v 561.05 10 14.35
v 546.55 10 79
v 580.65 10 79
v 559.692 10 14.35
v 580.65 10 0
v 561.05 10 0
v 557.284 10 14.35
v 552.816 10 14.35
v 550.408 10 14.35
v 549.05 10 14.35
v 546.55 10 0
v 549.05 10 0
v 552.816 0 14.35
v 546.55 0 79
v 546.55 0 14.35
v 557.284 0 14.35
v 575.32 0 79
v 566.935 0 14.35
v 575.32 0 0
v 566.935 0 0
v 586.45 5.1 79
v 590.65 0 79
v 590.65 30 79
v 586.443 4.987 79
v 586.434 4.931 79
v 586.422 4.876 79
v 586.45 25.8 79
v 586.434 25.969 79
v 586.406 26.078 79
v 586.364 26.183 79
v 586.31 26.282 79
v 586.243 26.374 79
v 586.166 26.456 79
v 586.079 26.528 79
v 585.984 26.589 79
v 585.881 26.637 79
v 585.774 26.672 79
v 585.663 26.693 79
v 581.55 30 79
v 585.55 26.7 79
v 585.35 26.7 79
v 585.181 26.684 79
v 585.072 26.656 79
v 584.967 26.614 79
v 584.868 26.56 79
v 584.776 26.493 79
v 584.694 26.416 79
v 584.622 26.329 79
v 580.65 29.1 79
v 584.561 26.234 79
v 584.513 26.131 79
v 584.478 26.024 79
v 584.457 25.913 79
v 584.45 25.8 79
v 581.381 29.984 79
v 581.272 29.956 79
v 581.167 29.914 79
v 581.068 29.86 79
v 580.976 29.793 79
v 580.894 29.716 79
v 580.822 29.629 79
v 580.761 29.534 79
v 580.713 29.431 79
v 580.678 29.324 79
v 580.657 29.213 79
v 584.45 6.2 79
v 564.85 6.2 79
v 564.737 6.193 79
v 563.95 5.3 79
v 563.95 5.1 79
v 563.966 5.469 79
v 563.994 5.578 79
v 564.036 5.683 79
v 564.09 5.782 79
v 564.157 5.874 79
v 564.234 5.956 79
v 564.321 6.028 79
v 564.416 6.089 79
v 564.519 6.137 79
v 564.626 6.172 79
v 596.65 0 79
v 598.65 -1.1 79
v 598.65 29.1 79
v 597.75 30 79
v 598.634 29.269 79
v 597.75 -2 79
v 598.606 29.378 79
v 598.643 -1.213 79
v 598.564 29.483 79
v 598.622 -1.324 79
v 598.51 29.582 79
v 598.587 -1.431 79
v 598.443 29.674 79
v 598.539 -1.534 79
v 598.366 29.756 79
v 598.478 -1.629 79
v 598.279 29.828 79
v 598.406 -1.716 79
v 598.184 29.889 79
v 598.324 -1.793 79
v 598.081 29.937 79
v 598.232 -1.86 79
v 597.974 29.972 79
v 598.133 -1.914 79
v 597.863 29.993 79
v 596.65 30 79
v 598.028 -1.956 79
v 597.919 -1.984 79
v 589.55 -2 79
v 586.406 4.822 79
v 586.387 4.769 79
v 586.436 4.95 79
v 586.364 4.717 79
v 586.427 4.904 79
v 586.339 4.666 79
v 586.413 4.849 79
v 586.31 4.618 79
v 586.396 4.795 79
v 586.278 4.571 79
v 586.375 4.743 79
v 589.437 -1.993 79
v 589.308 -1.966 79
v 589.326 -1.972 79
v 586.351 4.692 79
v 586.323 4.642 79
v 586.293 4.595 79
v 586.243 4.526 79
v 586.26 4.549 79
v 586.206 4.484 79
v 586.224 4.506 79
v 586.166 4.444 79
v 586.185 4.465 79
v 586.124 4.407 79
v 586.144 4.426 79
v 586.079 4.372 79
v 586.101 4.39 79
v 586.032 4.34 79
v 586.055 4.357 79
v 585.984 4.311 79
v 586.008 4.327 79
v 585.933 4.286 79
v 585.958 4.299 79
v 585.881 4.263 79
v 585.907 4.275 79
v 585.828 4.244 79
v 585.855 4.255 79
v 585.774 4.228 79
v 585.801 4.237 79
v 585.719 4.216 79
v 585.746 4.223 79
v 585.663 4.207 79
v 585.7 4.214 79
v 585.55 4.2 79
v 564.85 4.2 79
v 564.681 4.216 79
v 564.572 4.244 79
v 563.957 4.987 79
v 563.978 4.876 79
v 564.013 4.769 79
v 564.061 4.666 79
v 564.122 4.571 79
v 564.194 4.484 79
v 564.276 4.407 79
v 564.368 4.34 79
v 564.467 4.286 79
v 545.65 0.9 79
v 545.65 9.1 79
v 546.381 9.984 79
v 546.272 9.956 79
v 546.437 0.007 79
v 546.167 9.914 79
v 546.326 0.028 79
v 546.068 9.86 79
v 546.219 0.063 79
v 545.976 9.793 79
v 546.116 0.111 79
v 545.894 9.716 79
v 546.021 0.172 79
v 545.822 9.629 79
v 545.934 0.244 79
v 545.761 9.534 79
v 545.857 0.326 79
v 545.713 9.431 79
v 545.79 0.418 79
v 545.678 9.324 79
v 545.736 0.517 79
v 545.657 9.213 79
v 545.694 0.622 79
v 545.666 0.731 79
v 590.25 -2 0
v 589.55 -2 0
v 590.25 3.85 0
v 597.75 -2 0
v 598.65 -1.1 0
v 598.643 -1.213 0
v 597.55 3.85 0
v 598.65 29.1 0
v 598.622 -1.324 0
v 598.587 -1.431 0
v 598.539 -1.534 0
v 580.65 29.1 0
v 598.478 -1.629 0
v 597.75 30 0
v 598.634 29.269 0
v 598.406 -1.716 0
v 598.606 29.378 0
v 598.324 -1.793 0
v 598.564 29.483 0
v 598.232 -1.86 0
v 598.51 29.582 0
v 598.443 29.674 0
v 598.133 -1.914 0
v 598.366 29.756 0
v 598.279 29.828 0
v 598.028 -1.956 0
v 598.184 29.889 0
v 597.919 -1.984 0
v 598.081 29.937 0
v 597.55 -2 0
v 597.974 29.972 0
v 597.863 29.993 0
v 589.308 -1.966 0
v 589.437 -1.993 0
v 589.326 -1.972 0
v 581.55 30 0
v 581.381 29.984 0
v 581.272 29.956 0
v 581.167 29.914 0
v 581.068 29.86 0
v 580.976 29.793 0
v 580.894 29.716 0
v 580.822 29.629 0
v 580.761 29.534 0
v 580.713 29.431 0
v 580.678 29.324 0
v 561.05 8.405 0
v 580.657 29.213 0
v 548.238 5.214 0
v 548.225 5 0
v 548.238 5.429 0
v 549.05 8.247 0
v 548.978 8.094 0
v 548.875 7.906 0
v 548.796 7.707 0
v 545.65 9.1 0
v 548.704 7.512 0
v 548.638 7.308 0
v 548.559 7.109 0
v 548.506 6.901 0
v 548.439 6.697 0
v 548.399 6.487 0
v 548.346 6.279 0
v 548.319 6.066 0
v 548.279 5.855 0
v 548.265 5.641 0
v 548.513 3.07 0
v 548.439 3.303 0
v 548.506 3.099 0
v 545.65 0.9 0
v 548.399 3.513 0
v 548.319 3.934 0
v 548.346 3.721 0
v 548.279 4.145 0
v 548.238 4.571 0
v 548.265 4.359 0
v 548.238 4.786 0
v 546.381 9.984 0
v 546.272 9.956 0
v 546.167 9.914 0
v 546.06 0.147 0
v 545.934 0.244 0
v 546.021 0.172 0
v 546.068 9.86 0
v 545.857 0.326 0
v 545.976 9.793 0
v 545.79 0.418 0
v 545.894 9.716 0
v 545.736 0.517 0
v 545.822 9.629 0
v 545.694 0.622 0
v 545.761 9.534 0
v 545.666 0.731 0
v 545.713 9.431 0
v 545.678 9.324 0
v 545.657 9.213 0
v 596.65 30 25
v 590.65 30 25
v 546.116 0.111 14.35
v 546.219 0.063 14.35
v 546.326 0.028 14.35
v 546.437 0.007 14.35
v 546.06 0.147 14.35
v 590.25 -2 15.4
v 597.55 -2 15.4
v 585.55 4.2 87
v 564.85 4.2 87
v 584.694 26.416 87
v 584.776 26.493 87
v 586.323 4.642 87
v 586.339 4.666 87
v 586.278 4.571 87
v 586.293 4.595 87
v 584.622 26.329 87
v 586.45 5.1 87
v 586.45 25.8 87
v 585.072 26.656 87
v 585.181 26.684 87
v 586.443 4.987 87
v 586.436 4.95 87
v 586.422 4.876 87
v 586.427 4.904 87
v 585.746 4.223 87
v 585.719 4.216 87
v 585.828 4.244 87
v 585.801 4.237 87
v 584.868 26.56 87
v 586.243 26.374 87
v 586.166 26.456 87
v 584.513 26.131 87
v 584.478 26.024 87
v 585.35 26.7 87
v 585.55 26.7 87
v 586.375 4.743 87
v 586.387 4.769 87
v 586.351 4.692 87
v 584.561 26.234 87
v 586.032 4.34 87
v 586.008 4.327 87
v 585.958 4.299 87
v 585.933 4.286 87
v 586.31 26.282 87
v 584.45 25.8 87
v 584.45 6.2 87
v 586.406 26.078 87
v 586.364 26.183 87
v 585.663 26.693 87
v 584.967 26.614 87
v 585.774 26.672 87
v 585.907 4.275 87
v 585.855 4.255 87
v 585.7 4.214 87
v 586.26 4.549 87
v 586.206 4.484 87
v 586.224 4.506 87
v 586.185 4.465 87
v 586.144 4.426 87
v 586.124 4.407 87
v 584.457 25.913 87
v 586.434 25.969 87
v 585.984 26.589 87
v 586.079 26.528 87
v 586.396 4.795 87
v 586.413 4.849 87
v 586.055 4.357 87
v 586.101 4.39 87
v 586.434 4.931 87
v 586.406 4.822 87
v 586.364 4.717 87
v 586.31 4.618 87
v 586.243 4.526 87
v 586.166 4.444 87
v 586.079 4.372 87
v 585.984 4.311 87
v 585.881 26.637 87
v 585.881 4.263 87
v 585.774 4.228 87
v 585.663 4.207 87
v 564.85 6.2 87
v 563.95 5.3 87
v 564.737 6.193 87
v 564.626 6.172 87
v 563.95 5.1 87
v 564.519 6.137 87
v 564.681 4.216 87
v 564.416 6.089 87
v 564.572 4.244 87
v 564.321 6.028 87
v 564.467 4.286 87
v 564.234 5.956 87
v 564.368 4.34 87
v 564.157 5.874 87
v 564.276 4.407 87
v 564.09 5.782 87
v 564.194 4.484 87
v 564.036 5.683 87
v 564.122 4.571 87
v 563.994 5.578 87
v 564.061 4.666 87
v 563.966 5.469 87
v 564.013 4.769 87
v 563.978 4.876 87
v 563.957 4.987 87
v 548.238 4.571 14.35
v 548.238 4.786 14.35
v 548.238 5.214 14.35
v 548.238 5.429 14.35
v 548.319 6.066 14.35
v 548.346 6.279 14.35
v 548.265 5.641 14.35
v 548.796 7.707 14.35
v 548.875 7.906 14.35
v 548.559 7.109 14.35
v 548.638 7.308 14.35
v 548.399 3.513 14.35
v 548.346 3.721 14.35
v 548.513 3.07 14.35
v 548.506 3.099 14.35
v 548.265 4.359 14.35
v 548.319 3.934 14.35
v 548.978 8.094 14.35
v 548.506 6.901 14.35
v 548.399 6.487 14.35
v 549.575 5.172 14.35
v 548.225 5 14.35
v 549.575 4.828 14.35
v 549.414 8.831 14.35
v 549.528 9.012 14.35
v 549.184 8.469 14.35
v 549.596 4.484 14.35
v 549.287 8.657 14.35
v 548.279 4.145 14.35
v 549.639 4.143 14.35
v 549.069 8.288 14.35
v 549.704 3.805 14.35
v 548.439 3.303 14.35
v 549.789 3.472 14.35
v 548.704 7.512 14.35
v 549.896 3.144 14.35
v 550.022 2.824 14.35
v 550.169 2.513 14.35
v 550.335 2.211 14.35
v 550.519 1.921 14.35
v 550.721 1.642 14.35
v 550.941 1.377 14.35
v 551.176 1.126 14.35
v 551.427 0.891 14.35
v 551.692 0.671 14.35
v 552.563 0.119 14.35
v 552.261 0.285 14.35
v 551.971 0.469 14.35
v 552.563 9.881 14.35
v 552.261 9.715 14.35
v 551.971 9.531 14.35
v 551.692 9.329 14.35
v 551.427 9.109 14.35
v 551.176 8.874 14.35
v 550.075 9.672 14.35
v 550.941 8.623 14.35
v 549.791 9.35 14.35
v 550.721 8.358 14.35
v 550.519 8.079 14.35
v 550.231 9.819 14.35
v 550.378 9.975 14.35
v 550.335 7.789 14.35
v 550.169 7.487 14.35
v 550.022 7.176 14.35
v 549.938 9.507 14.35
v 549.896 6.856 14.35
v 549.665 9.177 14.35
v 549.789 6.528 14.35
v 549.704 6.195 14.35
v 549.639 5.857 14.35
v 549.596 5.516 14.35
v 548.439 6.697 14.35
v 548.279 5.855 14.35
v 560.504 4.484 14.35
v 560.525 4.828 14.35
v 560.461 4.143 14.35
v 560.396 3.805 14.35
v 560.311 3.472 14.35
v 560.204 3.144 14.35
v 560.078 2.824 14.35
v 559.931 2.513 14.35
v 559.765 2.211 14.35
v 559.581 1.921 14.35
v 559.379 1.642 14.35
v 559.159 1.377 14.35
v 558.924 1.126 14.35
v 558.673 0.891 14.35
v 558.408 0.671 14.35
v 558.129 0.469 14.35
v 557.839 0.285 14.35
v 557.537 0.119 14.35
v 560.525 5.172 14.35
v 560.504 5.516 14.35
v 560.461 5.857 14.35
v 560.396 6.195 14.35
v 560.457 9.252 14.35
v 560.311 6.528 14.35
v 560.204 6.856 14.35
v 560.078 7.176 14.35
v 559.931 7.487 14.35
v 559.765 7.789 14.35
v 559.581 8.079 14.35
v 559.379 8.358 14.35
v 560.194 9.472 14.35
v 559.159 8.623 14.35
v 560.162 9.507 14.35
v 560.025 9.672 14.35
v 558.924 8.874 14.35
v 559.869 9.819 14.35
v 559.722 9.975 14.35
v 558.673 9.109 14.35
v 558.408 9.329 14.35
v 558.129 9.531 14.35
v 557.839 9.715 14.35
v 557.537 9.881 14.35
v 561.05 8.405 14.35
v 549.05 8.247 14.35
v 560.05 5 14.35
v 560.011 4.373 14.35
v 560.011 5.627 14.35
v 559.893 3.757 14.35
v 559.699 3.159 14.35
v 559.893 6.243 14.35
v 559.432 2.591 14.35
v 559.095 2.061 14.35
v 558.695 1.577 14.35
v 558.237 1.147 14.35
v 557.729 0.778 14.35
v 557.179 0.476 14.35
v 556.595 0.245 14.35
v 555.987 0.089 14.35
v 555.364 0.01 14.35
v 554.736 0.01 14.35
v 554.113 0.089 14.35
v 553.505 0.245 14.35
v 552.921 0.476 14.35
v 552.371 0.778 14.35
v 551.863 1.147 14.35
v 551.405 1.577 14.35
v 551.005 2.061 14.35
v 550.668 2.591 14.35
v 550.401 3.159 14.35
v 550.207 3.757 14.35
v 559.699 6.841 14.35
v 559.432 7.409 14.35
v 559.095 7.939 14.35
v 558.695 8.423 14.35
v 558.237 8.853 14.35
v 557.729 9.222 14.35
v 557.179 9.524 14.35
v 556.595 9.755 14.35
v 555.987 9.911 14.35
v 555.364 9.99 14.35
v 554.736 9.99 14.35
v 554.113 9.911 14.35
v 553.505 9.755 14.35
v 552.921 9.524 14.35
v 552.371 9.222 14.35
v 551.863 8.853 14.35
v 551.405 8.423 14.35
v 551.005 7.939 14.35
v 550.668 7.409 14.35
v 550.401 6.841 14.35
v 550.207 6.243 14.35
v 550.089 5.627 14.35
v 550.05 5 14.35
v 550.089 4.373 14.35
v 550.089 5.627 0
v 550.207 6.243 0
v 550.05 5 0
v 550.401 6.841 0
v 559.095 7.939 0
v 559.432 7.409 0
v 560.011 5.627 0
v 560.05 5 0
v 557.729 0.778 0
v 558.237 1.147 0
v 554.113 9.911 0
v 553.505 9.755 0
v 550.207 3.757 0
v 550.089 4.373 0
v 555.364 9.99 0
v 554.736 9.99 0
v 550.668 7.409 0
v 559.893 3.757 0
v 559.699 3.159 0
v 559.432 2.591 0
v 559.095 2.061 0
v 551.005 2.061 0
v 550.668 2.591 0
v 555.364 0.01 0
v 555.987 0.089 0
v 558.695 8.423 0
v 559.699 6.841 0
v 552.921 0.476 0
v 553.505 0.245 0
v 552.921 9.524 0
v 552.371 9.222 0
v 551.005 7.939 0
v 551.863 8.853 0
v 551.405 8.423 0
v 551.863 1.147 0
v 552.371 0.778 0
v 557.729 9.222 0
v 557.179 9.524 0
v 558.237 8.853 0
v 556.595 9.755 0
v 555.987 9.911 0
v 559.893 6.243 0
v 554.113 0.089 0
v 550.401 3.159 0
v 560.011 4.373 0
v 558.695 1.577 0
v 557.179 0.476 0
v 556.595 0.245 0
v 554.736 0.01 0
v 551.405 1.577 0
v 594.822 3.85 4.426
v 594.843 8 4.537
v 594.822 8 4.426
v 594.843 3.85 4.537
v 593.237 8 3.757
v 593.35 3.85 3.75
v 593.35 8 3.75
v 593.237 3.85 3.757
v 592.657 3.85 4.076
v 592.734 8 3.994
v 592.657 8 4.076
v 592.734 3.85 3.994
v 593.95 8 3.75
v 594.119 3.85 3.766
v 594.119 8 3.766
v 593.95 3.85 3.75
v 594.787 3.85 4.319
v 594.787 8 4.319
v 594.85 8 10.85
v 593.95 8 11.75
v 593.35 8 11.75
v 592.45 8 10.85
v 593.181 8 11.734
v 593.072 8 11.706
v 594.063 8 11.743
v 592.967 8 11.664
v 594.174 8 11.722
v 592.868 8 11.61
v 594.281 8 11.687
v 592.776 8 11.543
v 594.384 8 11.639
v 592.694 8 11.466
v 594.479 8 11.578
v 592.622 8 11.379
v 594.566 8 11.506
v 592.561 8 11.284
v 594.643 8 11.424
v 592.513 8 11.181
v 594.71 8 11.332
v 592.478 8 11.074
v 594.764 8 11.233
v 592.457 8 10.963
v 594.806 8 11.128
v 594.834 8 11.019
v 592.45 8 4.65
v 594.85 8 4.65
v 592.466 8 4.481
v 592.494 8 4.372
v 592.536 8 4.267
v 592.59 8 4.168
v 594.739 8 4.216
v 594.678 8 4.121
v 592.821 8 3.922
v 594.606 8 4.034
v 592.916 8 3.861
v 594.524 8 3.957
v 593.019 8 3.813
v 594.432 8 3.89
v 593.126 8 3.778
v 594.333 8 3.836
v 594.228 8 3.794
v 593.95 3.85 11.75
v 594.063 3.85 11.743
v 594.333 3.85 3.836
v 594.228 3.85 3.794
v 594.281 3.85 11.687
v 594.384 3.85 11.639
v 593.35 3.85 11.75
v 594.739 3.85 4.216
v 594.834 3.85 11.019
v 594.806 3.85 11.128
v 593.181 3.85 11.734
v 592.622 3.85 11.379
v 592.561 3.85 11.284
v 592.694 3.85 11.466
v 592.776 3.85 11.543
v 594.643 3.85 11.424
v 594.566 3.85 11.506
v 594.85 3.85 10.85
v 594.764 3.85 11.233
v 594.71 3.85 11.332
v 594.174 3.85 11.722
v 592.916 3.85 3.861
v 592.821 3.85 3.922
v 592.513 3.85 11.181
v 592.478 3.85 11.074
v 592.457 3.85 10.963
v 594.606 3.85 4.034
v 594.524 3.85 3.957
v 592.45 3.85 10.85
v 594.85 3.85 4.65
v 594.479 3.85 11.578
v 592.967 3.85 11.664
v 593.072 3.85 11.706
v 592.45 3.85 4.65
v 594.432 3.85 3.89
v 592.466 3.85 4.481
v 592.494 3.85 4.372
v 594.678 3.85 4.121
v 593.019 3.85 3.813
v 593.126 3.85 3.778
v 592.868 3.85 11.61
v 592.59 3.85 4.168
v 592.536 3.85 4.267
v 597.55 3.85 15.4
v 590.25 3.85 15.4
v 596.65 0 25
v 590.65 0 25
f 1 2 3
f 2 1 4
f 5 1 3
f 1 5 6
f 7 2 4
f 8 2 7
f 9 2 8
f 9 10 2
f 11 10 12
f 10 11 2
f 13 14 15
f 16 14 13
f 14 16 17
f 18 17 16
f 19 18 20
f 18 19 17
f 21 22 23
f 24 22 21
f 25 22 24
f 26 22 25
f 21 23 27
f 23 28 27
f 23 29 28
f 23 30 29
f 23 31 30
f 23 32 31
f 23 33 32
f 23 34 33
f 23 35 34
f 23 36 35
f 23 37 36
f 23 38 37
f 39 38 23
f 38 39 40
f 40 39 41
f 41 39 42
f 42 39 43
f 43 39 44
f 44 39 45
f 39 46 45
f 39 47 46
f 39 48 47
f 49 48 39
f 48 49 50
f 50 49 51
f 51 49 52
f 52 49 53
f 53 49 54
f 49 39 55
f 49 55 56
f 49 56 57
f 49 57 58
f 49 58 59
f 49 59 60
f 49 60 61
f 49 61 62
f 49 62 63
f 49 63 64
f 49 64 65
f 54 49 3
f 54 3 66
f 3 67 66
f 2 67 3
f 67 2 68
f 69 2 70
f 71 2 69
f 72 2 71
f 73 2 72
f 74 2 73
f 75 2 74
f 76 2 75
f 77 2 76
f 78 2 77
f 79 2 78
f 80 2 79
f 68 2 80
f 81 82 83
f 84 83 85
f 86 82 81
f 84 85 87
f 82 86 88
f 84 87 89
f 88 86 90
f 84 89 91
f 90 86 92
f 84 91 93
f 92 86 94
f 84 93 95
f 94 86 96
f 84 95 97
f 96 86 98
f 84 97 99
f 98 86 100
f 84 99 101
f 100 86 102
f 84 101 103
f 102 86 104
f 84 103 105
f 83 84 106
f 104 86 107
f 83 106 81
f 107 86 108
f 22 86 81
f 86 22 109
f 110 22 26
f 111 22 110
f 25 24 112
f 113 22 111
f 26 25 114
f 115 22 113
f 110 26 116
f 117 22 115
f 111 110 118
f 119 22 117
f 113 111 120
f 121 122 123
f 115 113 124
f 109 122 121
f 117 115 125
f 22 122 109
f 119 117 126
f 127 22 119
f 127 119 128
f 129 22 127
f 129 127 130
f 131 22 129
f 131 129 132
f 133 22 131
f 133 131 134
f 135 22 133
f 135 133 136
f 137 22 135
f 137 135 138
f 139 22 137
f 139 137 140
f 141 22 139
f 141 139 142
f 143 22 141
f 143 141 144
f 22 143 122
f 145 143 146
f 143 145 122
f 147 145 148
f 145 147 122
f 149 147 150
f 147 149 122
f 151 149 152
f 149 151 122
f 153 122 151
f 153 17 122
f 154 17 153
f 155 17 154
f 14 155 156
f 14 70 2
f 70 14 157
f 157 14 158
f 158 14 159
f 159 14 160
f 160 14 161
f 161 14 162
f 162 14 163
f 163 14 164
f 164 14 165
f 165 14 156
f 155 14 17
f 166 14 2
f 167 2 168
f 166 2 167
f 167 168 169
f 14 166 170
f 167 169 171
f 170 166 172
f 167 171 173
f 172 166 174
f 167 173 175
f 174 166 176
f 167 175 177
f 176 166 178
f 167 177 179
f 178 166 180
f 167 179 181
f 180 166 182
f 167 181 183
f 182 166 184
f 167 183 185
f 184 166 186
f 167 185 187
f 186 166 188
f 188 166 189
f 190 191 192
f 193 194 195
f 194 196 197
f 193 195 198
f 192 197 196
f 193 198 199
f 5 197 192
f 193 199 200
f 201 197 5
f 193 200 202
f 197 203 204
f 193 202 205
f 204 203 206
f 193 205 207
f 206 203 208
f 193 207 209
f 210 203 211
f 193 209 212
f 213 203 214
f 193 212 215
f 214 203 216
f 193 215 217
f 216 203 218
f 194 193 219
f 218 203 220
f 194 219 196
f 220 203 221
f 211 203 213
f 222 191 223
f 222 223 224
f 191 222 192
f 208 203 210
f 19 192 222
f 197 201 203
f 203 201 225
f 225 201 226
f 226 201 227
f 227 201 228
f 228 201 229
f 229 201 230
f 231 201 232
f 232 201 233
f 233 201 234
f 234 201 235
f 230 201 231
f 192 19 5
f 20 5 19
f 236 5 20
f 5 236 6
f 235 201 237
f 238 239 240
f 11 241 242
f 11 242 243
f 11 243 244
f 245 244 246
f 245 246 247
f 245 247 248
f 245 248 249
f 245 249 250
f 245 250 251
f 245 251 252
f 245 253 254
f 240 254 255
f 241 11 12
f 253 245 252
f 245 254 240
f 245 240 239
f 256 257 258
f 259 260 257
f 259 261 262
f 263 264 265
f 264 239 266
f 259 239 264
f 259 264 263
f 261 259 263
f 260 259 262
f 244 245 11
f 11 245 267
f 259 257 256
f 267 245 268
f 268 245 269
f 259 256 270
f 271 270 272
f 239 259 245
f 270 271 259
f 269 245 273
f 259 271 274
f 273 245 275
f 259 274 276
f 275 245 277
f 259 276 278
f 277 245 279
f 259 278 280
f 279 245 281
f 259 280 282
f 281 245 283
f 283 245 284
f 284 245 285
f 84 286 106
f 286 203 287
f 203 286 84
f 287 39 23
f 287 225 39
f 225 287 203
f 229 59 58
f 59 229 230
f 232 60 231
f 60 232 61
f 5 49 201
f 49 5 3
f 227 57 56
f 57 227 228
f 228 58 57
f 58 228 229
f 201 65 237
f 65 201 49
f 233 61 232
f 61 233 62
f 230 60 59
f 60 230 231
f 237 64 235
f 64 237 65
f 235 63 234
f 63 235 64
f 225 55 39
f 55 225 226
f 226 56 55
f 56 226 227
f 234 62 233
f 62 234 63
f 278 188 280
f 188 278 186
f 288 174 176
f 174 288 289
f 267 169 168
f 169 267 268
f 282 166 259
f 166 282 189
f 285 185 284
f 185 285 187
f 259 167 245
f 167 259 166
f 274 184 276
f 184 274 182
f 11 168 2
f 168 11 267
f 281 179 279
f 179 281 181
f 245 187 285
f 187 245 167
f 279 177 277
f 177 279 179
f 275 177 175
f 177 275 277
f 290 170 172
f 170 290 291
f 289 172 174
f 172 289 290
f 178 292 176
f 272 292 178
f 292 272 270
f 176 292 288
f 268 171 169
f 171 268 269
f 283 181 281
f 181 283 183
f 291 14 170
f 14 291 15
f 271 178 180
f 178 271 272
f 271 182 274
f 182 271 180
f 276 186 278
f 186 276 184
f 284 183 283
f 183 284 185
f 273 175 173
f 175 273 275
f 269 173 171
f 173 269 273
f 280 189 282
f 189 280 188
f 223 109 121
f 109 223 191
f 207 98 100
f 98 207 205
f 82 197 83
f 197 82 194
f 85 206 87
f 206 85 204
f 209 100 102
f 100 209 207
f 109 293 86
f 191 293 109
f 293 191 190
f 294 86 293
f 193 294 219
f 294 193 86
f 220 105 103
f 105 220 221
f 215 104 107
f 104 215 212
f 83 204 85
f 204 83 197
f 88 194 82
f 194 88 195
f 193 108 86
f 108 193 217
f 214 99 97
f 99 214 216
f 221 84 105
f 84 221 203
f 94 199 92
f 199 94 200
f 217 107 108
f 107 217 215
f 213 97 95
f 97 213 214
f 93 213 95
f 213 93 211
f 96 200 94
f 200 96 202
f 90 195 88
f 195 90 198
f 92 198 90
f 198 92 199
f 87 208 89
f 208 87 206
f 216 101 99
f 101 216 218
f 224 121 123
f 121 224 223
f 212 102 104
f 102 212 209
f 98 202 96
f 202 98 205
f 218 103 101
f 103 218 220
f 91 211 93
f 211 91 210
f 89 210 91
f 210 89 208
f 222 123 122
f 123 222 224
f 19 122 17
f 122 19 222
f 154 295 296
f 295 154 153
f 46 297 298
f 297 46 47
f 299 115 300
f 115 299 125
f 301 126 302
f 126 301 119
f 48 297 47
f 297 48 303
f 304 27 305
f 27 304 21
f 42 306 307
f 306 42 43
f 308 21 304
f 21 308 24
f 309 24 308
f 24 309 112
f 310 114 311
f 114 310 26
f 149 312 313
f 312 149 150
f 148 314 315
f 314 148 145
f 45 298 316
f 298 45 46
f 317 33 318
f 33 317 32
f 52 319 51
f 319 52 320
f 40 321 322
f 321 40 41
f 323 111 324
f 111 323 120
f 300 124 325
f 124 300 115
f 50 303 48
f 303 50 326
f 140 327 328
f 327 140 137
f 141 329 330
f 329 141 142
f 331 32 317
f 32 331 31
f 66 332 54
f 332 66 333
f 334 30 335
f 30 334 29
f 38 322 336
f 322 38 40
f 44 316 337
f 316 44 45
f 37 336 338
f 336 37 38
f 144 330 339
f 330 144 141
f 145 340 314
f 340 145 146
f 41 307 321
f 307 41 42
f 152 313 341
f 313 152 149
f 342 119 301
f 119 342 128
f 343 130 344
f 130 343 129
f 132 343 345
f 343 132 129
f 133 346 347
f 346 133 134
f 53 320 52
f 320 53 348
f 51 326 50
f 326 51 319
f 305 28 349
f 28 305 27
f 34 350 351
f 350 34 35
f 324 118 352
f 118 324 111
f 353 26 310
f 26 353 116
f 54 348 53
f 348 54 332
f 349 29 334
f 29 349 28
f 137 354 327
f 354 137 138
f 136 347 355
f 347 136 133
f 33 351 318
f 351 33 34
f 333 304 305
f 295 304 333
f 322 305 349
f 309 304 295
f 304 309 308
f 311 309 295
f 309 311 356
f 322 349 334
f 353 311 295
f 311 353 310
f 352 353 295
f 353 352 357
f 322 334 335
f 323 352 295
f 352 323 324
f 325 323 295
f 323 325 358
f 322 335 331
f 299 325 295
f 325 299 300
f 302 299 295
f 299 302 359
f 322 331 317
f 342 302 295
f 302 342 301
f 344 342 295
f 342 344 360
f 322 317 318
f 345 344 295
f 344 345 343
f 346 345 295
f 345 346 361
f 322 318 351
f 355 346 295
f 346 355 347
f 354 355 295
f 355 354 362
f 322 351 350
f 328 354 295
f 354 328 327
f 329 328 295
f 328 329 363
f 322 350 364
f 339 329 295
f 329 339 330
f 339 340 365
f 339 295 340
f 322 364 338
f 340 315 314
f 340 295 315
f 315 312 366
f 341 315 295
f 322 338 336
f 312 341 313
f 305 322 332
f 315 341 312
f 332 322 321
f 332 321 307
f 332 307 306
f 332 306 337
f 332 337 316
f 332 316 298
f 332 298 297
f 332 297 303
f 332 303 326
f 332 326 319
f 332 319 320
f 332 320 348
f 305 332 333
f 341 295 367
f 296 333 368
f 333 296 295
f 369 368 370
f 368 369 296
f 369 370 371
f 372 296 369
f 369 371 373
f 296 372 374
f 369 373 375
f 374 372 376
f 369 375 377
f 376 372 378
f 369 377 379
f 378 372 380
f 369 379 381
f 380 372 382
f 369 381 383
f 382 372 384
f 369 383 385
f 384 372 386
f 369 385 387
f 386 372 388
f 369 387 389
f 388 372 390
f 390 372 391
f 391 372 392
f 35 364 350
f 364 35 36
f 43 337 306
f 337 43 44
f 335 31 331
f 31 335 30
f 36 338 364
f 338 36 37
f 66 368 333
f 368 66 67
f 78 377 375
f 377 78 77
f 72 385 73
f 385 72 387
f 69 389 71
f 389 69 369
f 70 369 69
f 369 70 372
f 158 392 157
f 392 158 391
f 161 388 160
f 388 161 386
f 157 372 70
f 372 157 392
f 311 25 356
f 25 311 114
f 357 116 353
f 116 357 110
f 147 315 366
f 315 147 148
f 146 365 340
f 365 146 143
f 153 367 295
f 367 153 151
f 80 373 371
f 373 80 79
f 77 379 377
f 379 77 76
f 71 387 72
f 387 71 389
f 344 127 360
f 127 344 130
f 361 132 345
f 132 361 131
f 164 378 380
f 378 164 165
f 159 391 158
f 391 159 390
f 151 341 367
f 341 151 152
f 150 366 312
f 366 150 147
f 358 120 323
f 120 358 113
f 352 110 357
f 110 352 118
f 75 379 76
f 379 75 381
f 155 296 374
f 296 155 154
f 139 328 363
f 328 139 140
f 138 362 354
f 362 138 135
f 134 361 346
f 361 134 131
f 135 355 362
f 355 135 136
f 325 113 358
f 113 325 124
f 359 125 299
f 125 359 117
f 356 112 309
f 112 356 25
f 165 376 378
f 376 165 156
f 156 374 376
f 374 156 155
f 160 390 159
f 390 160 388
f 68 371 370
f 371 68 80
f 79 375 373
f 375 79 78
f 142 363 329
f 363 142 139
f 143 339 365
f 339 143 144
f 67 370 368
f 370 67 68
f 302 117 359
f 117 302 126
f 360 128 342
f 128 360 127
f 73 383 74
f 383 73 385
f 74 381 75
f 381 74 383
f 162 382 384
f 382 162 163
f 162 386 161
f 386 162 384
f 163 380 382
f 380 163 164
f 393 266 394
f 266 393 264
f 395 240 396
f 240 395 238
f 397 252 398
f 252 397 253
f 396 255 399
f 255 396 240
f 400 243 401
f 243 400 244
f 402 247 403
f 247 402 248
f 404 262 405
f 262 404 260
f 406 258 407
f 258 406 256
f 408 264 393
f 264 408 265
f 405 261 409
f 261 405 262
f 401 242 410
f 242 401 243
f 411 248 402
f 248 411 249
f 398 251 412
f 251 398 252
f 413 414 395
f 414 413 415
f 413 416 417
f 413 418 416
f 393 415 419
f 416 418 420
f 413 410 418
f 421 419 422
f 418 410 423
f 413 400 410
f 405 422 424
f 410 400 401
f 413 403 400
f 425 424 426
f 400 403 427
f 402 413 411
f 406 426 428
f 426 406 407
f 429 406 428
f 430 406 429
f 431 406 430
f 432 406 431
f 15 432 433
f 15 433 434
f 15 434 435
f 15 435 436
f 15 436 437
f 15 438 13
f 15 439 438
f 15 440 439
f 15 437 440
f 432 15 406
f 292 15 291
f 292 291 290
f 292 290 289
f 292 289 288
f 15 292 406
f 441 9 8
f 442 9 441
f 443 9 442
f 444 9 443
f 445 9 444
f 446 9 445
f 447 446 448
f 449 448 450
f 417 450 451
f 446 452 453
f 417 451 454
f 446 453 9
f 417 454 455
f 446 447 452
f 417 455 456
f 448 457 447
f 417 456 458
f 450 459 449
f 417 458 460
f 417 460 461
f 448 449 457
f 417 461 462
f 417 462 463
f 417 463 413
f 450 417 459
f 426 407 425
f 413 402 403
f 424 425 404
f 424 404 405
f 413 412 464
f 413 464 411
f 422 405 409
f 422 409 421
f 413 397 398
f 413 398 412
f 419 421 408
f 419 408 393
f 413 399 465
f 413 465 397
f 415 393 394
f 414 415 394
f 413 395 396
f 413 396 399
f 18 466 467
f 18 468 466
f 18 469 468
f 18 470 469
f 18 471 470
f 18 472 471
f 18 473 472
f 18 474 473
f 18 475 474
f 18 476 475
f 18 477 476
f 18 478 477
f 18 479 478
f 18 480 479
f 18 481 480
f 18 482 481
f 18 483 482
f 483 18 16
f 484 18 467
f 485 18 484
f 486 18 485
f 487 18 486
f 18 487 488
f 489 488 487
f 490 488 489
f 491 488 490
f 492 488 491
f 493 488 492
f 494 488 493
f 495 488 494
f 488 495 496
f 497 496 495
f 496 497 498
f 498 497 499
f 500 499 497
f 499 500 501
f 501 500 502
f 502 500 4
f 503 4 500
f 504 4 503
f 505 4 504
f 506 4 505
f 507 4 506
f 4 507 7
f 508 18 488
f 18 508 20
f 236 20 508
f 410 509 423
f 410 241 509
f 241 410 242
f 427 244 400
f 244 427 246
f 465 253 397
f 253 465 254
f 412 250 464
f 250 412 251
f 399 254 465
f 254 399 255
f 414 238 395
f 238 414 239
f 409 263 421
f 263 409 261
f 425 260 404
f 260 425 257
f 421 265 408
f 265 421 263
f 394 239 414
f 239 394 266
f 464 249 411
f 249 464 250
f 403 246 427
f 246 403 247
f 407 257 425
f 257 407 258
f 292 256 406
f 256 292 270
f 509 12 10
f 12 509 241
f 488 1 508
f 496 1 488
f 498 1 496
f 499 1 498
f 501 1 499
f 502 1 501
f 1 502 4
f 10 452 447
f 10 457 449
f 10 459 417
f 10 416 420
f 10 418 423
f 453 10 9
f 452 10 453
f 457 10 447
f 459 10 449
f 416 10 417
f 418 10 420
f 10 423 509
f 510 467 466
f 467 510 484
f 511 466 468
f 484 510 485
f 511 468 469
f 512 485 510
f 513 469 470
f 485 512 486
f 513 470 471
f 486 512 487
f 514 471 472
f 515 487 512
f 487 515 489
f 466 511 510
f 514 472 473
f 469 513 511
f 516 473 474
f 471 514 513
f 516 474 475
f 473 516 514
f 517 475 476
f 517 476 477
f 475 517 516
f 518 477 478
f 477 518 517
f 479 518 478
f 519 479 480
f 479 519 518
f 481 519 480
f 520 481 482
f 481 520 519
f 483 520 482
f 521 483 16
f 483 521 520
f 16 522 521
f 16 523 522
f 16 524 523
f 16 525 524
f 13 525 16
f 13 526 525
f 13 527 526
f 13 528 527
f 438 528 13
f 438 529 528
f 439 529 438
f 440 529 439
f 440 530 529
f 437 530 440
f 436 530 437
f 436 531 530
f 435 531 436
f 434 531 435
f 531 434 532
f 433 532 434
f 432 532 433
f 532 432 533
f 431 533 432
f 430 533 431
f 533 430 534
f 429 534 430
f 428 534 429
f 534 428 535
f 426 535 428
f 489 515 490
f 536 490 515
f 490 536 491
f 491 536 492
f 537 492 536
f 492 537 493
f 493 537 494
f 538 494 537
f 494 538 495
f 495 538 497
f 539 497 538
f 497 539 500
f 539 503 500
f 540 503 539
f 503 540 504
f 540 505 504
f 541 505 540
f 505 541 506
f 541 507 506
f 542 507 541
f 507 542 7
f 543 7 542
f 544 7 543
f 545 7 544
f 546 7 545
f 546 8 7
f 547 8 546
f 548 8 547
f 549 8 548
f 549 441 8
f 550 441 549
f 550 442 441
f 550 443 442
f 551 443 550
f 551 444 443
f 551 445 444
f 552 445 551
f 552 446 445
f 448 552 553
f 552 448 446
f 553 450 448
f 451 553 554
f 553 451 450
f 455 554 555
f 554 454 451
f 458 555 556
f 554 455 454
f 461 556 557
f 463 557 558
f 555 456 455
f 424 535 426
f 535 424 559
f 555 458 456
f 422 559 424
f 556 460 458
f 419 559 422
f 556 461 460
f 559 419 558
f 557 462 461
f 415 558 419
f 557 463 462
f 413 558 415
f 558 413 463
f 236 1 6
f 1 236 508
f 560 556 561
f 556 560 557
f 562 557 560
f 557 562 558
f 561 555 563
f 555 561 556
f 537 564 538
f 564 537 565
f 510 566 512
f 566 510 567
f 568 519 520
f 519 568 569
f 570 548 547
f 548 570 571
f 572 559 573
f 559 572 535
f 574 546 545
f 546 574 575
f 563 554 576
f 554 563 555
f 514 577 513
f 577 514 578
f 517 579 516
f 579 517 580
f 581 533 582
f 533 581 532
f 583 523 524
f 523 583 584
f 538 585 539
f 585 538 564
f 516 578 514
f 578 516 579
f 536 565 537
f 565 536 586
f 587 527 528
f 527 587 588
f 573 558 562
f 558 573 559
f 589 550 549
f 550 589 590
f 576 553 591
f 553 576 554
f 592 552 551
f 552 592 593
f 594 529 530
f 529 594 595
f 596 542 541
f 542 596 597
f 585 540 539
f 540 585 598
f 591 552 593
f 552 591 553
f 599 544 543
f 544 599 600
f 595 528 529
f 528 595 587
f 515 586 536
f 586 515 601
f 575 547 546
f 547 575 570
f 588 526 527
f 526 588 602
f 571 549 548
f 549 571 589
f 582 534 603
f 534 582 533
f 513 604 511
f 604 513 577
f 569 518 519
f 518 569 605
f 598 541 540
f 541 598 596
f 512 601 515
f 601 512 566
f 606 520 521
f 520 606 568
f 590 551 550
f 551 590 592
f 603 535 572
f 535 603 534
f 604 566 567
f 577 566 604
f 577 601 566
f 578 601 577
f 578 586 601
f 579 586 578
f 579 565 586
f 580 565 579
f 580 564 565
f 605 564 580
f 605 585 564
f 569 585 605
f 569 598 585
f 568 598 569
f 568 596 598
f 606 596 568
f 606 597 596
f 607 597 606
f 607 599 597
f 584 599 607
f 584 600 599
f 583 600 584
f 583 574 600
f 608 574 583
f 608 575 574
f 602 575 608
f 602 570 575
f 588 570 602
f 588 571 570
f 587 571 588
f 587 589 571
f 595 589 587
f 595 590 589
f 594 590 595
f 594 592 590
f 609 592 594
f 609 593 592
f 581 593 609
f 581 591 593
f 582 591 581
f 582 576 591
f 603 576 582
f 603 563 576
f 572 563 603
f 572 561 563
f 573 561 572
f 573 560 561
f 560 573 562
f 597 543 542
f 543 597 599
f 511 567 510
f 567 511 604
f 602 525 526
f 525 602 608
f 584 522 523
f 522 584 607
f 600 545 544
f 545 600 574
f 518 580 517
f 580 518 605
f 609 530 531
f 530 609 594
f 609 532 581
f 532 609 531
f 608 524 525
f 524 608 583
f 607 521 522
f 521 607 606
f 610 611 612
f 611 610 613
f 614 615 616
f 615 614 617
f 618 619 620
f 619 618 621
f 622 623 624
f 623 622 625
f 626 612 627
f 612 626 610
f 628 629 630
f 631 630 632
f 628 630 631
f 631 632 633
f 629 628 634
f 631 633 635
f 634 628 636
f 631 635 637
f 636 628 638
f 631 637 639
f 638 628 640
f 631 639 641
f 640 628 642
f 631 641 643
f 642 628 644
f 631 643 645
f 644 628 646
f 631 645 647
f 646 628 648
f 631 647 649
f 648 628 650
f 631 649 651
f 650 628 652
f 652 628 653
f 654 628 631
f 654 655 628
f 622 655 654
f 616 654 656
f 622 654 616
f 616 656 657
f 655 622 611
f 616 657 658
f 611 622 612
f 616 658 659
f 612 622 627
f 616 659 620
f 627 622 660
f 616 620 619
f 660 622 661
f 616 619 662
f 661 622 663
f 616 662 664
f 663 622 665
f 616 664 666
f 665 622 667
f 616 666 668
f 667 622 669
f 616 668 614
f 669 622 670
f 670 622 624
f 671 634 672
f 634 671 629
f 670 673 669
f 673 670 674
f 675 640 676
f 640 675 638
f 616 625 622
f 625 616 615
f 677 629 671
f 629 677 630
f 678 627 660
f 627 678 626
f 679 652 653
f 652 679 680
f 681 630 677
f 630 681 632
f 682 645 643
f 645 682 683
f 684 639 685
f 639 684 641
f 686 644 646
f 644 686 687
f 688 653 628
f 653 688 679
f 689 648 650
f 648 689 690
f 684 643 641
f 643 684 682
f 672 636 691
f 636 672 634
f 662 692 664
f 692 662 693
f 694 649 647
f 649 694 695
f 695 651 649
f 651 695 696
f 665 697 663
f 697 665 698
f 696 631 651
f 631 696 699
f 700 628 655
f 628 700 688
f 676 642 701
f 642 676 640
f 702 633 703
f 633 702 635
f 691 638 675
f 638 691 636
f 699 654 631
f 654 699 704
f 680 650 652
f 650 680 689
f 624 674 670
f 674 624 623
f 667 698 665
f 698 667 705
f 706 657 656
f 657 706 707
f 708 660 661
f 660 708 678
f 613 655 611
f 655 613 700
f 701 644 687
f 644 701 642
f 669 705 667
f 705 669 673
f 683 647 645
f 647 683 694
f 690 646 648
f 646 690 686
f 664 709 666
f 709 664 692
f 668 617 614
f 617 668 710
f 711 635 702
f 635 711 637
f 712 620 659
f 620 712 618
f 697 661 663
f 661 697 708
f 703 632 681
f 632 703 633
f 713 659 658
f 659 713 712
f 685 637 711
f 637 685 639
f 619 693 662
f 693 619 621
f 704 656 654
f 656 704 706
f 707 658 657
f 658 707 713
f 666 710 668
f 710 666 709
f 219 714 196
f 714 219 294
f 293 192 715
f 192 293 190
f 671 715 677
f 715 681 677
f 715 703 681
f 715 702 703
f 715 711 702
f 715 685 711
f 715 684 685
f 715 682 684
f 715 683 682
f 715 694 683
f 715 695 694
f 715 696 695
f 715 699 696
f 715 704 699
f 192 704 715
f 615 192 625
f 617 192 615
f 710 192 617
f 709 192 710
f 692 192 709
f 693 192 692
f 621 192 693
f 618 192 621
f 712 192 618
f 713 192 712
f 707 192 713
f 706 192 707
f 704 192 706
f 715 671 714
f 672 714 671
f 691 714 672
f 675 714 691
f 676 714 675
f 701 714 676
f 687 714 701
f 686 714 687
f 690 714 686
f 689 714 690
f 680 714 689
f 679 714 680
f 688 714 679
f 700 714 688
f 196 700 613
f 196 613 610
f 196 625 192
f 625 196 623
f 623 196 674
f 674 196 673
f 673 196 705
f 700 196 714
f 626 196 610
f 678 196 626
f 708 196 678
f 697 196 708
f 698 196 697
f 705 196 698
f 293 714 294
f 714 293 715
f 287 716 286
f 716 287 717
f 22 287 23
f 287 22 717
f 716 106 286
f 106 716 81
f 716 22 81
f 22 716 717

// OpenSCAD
// file: construction.scad
/*
Specialized construction functions specifically for the enclosure.
By combining these operators the various instances of enclosure pieces 
can be constructed.
*/
include <parameters.scad>;
use <utility.scad>;

module lug() {
    ra = knob_diameter/2;
    rb = lug_diameter/2;
    rotate([0,90,90]) 
        rotate_extrude()
            polygon([[0,0],[0,lug_height],[rb,lug_height],
                [rb,2.5],[ra,1],[ra,0]]);
}

// extend the corner frame to be symmetrical with the front corner
module extend_frame_x(height=frame_corner_height) {
    union() {
        children();
        color("SteelBlue")
        translate([hinge_inner_diameter*2, hinge_inner_diameter,0]) 
            rotate([0,0,-90])
                frame( hinge_inner_diameter*3+1, 
                    height, hinge_inner_diameter, 
                    corner_roundness );
    }
}

module frame( width, height, thickness, roundness ) {
        linear_extrude(height=height)
            apply_roundness(roundness, $fs =0.01) 
                    square( [thickness, width] );
}

module frame_corner( width, height, thickness, roundness ) {    
    union() {
        mirror([0,1,0]) 
            rotate([0,0,-90])
                frame( width, height, thickness, roundness );
        frame( width, height, thickness + panel_thickness, roundness );
    }   
}

module frame_connector_corner(clearance=0) {
    translate([panel_thickness*1.7,panel_thickness*0.70, 0]) 
        cornerize()
            frame( frame_corner_width*0.75, frame_connector_depth, 
                frame_thickness*.20+clearance, corner_roundness );
        
}

module add_lugs() {   
    union() {
        children();

        color("DarkSeaGreen")
        translate([lug_offset_x,-lug_height,lug_offset_z]) 
            lug();

        color("DarkSeaGreen")
        translate([lug_offset_x,-lug_height,
                lug_offset_z+lug_offset_gap])
            lug(); 
    } 
}

module add_connector(height=frame_corner_height) {
    union() {
        children();

        color("SteelBlue")
        translate([0,0,height])
            frame_connector_corner();
    }
}

module add_hinge_post( top=false ) {
    union() {
        difference() {
            children();

            // create a negative space that snuggly fits the hinge
            translate([frame_corner_width+plastic_thickness+hinge_gap,
                hinge_inner_diameter/2, (top?frame_corner_height:0)])
                mirror(top?[0,0,1]:[0,0,0])
                    union() {
                        height = hinge_height-hinge_inner_diameter;
                        translate([0,0,height/2-0.65]) 
                            cube([hinge_inner_diameter+2,
                                hinge_inner_diameter+2,height],true);
                        
                        // hinge open
                        rotate([0,0,-90]) 
                            translate([0,0,-1.4]) 
                                scale(1.05) hinge();
                        // hinge closed
                        rotate([0,0,0]) 
                            translate([0,0,-1.4]) 
                                scale(1.05) hinge();
                    }
            
        }
        color("SteelBlue")
        translate([frame_corner_width+plastic_thickness+hinge_gap,hinge_inner_diameter/2,0])
            cylinder(d=hinge_inner_diameter, frame_corner_height);
    }
}

module add_outside_frame( height ) {
    union() {
        children();
        translate([-plastic_thickness,-plastic_thickness,0])
            color("SteelBlue")
            frame( frame_corner_width+plastic_thickness, height, frame_thickness,
                corner_roundness);
        translate([14.5,0.05,height/2])
            color("SteelBlue")
            rotate([0,0,8])
            cube([frame_corner_width/2,plastic_thickness,height],true);
    }
}

module hinge() {
    height = hinge_height-hinge_inner_diameter;
    width = hinge_inner_diameter+hinge_ring_thickness;
    difference() {
        
        // create the base shape for the hinge
        union() {    
            cylinder(d=width, height);
            
            translate([hinge_inner_diameter*3+hinge_clearance,
                -hinge_offset,height/2-plastic_thickness/2]) 
                cube([hinge_length,hinge_thickness,
                    height+plastic_thickness],true);
           
            translate([2.52,-5.2,height/2]) 
                rotate([0,0,40]) 
                    cube([hinge_inner_diameter,
                        width+1,height],true);
        }
        
        // remove a hole for the hinge post to slide into
        cylinder(d=hinge_inner_diameter+tolerance_smooth, height+1);
        
        // trim the left corner
        translate([4,-17.5,height/2-1]) 
            rotate([0,0,145]) 
                cube([50,width-2,height+3],true);
        
        // smooth the tranistion to the bottom edge
        translate([19,-10,height/2-17.85]) 
            rotate([-88.5,0.1,96]) 
                cube([40,20,100],true);
        
        // add a chamfer to right corner
        translate([hinge_length+8,0,height+25]) 
            rotate([0,45,0]) 
            cube(50,true);
    }   
}

module add_connector_slot() {
    difference() {
        children();
        frame_connector_corner(tolerance_tight);
    }
}

module frame_vertical() {
    add_connector_slot()
    add_connector(frame_vertical_height)
    extend_frame_x(frame_vertical_height)
        frame_corner( frame_corner_width, 
            frame_vertical_height, frame_thickness, 
            corner_roundness );          
}

module add_snap_lock_slot() {
    difference() {
        children();
        translate([0,0,-shelf_height])
            snaplock(tolerance_tight);
        
        // remove area for snaplock to make sure 
        // straight edges in cut out
        width = snaplock_size+tolerance_tight+corner_roundness;
        height = snaplock_connector_size+tolerance_tight;
        depth = snaplock_width+plastic_thickness*2;
        translate([width/2-corner_roundness,plastic_thickness/2-1/2,height/2])
            rotate([90,0,0])
            cube([width,height,depth+1],true);
    }
}

module snaplock(clearance=0) {
    connector_thickness=frame_thickness*.20+clearance;
    union() {
        difference() {
            translate([snaplock_size,-plastic_thickness,-plastic_thickness])
                rotate([0,0,90])
                    frame(snaplock_size+clearance,shelf_height+snaplock_connector_size+plastic_thickness+clearance,
                        snaplock_width+plastic_thickness*2, corner_roundness);
            fix_preview2() cube([snaplock_size,snaplock_width+plastic_thickness,shelf_height]);
        }
        translate([snaplock_size - snaplock_size/2 - plastic_thickness/2,plastic_thickness-0.2,1])
            rotate([90,90,90])
                frame(plastic_thickness,plastic_thickness,plastic_thickness,corner_roundness);
        // connector
        translate([snaplock_size/2-connector_thickness/2,
            frame_connector_depth,
            shelf_height+snaplock_connector_size/2 - (snaplock_connector_size/4)])
            rotate([90,0,0])
            frame(frame_connector_depth,snaplock_connector_size/2,
                connector_thickness,corner_roundness);
    }
}
// file: support.scad
/*
Provides support objects that are used to model the environment of the enclosure
to ensure the pieces slot together and fit properly.
*/
include <parameters.scad>;
use <utility.scad>;

module wall_panel() {
    cube([panel_height,panel_width,panel_thickness]);
}

module door_panel() {
     cube([door_panel_width,door_panel_height,door_panel_thickness]);
}

module left_wall_panel() {
    translate([panel_thickness,0,panel_offset_z]) 
        rotate([0,-90,0]) 
            wall_panel();
}

module back_wall_panel() {
    translate([(enclosure_width-panel_width)/2,
            enclosure_depth-panel_thickness-plastic_thickness,
            panel_offset_z]) 
        rotate([-90,-90,0]) 
            wall_panel();
}

module right_wall_panel() {
    translate([enclosure_width,0,panel_offset_z]) 
        rotate([0,-90,0]) 
            wall_panel();
}

module left_door(open=false) {
    translate([frame_corner_width+plastic_thickness+hinge_gap,
            hinge_inner_diameter/2,0]) 
        rotate([90,0,open?-90:0]) 
            translate([door_hinge_offset,0,hinge_offset-
                    door_panel_thickness/2])
                door_panel();
}

module right_door(open=false) {
    translate([enclosure_width,0,0])  
        mirror([1,0,0]) left_door(open);
}
// file: utility.scad
/*
Generically useful utility functions.
*/

// applies roundness without altering dimensions of object
module apply_roundness(r)
    offset(r) offset(delta=-r) children(0);

// makes a corner piece by mirroring and rotating one side
module cornerize() {
    union() {
        children(0);
        mirror([0,1,0]) 
            rotate([0,0,-90])
                children(0);
    }
} 

module explode(vector) {
    for(i=[0:$children-1])
        translate(vector*i)
            children(i);

}

/*
 The fix_preview series of functions are used to make small
 translations in order to reduce conincident plane artifacts
 from the preview mode. 

 It would be nice to have just one module for this but I haven't
 figured out a way of doing this generically - so the following
 uses a small translation in different directions depending on
 the use case needed.
*/
module fix_preview() {
    translate($preview?[-0.001,-0.001,-0.001]:[0,0,0])
        children(0);
}

module fix_preview2() {
    translate($preview?[-0.001,0.001,-0.001]:[0,0,0])
        children(0);
}

module fix_preview3() {
    translate($preview?[-0.001,0.001,0.001]:[0,0,0])
        children(0);
}
// file: parameters.scad
$fn=50;

// Wall thickness and tolerance
plastic_thickness=2.0;
tolerance_smooth=0.45;
tolerance_tight=0.40;
corner_roundness=0.9;

// Specify enclosure dimensions
enclosure_height=475.0;
enclosure_depth=535.0;

// Wall panel dimensions
panel_thickness=6.0;
panel_height=450.0;
panel_width=535.0;
panel_offset_z = enclosure_height - panel_height;

// Door panel dimensions
door_panel_thickness=3.0;
door_panel_width=250.0;
door_panel_height=475.0;
door_hinge_offset=6.5;

// Frame
frame_corner_width=30.0;
frame_corner_height=79.0;
frame_thickness = plastic_thickness*2 + panel_thickness;
frame_side = (enclosure_height - frame_corner_height*2)/2;
frame_clip_height=50.5;
frame_vertical_height = (enclosure_height-frame_corner_height*2)/2;
frame_connector_depth = 8.0;

// Lug
knob_diameter=9.8;
lug_diameter=6.2;
lug_gap=1.4;
lug_height = lug_gap+2.15;
lug_offset_x=15.0;
lug_offset_z=27.0;
lug_offset_gap=32;

// Snaplock
shelf_height=51.0+tolerance_tight;
snaplock_width=1.3+tolerance_tight;
snaplock_size=6;
snaplock_connector_size=15;

// Door hinge
hinge_inner_diameter=10;
hinge_height=25;
hinge_length=53;
hinge_gap = 9.6;
hinge_clearance = 1.5;
hinge_ring_thickness=3.0;
hinge_thickness=plastic_thickness*2 + door_panel_thickness;
hinge_offset=6.5+plastic_thickness;

enclosure_width=2*(frame_corner_width+plastic_thickness+hinge_gap
    +door_hinge_offset) + door_panel_width*2 +tolerance_smooth;
// main file
include <parameters.scad>
use <utility.scad>
use <support.scad>
use <construction.scad>

module front_right_bottom_corner() {
    difference() {
        translate([enclosure_width,0,0])
            mirror([1,0,0])
                add_snap_lock_slot() 
                add_hinge_post(top=false)
                add_connector()  
                add_outside_frame(frame_corner_height) 
                extend_frame_x()          
                    color("SteelBlue") 
                    frame_corner( frame_corner_width, 
                        frame_corner_height,frame_thickness, 
                        corner_roundness);                   
        fix_preview() right_wall_panel();
    }
}

//%right_wall_panel();
front_right_bottom_corner();
